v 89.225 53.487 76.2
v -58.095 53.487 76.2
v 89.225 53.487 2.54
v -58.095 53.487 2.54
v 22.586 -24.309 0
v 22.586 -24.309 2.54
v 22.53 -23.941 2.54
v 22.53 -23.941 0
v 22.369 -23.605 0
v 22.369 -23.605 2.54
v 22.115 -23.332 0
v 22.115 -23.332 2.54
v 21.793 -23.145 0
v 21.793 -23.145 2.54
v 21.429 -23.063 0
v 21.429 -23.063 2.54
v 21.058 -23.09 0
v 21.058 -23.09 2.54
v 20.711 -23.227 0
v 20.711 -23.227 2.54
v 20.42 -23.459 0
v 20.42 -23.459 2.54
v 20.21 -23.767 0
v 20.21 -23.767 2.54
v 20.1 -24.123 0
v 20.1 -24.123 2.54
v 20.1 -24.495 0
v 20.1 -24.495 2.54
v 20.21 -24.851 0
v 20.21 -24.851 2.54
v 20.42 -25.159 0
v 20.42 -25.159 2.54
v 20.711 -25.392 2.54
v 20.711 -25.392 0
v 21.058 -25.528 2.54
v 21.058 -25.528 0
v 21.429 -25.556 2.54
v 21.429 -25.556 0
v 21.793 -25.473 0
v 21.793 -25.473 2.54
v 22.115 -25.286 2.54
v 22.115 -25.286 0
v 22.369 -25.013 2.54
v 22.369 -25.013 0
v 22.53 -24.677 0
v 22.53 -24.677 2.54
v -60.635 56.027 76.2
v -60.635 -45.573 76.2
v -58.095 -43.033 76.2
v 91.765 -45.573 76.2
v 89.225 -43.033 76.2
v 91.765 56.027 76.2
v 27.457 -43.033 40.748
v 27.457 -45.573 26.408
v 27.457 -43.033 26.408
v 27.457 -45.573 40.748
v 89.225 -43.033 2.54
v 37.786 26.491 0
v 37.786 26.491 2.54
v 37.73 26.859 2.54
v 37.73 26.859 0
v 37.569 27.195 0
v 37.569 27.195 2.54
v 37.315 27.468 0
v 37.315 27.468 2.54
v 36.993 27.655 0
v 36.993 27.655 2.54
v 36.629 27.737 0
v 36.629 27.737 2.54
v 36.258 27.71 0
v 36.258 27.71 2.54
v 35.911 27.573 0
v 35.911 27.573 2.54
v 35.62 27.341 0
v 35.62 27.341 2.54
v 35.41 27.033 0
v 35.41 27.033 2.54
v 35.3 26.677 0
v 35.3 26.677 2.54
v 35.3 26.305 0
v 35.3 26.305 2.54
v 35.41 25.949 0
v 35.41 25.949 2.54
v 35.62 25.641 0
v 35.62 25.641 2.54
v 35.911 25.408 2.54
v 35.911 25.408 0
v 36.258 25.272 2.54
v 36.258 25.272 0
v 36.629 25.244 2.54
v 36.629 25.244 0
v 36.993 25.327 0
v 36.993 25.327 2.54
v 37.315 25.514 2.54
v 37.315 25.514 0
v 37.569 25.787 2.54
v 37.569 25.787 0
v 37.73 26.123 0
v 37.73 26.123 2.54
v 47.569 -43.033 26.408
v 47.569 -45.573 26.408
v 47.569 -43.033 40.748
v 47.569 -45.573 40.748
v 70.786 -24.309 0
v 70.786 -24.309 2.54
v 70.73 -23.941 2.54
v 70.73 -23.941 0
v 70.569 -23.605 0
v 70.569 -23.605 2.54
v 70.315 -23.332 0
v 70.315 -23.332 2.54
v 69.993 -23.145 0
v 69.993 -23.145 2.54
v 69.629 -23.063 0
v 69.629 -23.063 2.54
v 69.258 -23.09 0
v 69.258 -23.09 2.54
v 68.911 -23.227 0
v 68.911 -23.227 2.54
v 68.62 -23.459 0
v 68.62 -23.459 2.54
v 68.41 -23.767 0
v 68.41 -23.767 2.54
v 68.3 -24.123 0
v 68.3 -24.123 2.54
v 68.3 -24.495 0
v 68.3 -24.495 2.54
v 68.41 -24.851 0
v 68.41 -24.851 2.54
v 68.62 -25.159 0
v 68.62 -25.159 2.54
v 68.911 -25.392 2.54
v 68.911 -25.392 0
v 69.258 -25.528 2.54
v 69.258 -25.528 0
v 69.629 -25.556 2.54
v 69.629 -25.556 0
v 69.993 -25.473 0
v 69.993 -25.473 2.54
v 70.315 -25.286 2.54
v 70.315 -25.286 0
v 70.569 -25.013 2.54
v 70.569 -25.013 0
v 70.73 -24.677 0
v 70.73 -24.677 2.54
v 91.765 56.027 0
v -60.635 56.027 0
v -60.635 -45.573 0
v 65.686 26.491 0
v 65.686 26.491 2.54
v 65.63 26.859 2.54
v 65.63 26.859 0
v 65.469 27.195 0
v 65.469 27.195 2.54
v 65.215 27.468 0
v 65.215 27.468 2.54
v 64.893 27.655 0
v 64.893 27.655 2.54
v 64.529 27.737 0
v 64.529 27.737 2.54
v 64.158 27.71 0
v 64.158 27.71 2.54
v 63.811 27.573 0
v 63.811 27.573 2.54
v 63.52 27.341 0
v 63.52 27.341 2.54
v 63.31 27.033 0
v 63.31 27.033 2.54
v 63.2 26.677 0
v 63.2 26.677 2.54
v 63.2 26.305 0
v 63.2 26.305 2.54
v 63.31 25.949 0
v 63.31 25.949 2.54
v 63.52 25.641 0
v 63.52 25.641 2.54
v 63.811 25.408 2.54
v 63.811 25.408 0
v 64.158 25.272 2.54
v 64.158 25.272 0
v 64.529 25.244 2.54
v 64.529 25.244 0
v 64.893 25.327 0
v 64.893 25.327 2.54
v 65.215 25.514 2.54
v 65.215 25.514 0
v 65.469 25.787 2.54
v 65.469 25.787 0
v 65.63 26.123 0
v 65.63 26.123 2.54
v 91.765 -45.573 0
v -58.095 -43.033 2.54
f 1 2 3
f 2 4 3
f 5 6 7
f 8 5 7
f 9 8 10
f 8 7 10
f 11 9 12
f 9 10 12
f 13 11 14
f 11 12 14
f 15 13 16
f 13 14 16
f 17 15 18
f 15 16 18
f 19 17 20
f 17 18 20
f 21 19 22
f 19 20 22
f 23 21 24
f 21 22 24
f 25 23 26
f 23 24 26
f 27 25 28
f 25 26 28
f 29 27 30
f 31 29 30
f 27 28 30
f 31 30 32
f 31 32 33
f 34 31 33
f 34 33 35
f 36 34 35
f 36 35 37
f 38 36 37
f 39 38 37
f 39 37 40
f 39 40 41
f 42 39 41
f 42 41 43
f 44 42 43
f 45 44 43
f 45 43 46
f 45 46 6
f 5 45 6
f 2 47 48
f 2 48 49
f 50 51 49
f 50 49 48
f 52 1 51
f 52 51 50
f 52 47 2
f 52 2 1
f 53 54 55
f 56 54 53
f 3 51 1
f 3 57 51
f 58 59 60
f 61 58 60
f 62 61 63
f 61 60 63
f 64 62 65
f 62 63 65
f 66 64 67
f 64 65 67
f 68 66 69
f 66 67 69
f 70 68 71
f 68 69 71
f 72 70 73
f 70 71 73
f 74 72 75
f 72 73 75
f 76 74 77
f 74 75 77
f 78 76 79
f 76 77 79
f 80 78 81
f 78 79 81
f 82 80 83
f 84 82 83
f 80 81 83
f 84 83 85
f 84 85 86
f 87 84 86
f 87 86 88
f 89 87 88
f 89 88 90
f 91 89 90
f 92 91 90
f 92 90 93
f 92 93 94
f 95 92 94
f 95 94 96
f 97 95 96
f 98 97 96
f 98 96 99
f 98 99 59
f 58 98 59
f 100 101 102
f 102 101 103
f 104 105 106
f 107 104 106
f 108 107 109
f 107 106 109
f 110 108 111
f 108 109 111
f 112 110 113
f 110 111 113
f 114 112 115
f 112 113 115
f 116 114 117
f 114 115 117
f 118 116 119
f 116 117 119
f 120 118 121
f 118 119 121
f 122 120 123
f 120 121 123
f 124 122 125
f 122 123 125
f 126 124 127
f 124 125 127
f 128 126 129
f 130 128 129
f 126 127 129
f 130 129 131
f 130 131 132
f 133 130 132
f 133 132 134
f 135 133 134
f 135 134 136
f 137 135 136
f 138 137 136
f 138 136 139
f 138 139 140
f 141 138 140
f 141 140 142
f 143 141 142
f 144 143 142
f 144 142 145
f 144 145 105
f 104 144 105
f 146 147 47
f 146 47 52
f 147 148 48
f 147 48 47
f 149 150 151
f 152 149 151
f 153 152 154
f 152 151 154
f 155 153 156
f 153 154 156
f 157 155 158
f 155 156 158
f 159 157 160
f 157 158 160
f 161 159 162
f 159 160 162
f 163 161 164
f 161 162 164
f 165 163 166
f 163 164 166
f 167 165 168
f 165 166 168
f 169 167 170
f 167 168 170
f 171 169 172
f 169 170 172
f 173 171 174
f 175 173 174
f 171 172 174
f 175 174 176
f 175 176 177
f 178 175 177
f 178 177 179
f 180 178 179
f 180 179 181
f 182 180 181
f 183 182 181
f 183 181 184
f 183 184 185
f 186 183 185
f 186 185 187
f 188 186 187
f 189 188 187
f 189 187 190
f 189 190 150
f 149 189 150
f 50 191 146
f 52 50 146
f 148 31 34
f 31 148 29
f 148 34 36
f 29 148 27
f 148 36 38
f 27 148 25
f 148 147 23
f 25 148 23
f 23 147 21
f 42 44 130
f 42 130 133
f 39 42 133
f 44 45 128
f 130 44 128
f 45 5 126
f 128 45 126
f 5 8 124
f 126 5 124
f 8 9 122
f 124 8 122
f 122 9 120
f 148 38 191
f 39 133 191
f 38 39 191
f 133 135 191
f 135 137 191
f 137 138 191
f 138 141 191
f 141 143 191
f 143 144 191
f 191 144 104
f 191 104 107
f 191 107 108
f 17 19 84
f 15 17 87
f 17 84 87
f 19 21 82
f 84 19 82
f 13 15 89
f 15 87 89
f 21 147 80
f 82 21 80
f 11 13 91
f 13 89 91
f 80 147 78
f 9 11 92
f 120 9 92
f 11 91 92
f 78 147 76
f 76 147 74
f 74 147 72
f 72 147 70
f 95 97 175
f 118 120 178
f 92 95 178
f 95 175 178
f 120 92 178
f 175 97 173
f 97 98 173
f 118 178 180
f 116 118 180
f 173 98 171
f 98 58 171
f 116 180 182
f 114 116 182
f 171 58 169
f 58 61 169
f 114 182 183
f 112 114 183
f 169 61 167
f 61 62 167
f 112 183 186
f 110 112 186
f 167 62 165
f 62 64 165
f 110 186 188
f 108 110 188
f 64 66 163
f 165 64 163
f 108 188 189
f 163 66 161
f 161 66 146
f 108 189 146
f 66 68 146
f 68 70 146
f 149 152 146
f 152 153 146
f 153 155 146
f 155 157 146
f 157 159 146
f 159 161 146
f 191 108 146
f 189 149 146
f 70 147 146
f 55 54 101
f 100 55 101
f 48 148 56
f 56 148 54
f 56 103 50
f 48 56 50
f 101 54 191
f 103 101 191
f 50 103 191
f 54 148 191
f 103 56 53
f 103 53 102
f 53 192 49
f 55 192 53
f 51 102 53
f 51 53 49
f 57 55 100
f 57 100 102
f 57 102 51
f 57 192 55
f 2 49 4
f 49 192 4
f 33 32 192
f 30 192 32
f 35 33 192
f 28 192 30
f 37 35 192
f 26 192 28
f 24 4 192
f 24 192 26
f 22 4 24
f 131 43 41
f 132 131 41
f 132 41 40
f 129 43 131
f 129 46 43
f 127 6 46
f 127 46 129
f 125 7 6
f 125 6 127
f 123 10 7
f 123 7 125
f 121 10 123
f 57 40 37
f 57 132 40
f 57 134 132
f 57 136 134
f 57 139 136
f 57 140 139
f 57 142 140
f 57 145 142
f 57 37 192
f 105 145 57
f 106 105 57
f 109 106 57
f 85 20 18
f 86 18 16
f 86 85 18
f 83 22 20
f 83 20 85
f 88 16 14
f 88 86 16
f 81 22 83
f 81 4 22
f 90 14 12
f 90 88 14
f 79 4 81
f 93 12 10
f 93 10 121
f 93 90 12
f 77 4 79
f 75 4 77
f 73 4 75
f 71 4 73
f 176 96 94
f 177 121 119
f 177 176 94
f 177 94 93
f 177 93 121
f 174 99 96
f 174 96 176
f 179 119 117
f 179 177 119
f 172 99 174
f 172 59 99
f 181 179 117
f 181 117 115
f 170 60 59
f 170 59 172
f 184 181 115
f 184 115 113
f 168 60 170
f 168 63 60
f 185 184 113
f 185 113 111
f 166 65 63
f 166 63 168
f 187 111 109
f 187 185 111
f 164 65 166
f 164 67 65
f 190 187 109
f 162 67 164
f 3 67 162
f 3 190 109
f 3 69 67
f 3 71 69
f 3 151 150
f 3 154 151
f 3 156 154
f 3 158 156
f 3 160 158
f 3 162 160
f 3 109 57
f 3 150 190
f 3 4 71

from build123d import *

# Parameters (mm, degrees)
F0_W     = 152.4
F0_H     = 101.6
F1_DEPTH = 76.2
F2_T     = -2.54
F3_R     = 1.25
F4_DEPTH = 2.541
F5_W     = 20.111805
F5_H     = 14.340593
F6_DEPTH = 25.4


with BuildPart() as f1:
    # F0 (on Top) → F1 (new body)
    with BuildSketch(Plane.XY):
        with Locations((15.56479, 5.227069)):
            Rectangle(F0_W, F0_H)
    extrude(amount=F1_DEPTH)

    # F2
    f2_openings = [f1.faces().sort_by_distance(p)[0] for p in [
        (15.56479, 5.227069, 76.2),
    ]]
    offset(amount=F2_T, openings=f2_openings)

    # F3 (on face) → F4 (cut, through all)
    with BuildSketch(Plane.XY.offset(2.54)):
        with Locations((21.336, -24.30905)):
            Circle(F3_R)
        with Locations((36.536, 26.49095)):
            Circle(F3_R)
        with Locations((64.436, 26.49095)):
            Circle(F3_R)
        with Locations((69.536, -24.30905)):
            Circle(F3_R)
    extrude(amount=-F4_DEPTH, mode=Mode.SUBTRACT)

    # F5 (on face) → F6 (cut)
    with BuildSketch(Plane.XZ.offset(45.572931)):
        with Locations((37.512888, 33.577968)):
            Rectangle(F5_W, F5_H)
    extrude(amount=-F6_DEPTH, mode=Mode.SUBTRACT)


solid = f1.part
